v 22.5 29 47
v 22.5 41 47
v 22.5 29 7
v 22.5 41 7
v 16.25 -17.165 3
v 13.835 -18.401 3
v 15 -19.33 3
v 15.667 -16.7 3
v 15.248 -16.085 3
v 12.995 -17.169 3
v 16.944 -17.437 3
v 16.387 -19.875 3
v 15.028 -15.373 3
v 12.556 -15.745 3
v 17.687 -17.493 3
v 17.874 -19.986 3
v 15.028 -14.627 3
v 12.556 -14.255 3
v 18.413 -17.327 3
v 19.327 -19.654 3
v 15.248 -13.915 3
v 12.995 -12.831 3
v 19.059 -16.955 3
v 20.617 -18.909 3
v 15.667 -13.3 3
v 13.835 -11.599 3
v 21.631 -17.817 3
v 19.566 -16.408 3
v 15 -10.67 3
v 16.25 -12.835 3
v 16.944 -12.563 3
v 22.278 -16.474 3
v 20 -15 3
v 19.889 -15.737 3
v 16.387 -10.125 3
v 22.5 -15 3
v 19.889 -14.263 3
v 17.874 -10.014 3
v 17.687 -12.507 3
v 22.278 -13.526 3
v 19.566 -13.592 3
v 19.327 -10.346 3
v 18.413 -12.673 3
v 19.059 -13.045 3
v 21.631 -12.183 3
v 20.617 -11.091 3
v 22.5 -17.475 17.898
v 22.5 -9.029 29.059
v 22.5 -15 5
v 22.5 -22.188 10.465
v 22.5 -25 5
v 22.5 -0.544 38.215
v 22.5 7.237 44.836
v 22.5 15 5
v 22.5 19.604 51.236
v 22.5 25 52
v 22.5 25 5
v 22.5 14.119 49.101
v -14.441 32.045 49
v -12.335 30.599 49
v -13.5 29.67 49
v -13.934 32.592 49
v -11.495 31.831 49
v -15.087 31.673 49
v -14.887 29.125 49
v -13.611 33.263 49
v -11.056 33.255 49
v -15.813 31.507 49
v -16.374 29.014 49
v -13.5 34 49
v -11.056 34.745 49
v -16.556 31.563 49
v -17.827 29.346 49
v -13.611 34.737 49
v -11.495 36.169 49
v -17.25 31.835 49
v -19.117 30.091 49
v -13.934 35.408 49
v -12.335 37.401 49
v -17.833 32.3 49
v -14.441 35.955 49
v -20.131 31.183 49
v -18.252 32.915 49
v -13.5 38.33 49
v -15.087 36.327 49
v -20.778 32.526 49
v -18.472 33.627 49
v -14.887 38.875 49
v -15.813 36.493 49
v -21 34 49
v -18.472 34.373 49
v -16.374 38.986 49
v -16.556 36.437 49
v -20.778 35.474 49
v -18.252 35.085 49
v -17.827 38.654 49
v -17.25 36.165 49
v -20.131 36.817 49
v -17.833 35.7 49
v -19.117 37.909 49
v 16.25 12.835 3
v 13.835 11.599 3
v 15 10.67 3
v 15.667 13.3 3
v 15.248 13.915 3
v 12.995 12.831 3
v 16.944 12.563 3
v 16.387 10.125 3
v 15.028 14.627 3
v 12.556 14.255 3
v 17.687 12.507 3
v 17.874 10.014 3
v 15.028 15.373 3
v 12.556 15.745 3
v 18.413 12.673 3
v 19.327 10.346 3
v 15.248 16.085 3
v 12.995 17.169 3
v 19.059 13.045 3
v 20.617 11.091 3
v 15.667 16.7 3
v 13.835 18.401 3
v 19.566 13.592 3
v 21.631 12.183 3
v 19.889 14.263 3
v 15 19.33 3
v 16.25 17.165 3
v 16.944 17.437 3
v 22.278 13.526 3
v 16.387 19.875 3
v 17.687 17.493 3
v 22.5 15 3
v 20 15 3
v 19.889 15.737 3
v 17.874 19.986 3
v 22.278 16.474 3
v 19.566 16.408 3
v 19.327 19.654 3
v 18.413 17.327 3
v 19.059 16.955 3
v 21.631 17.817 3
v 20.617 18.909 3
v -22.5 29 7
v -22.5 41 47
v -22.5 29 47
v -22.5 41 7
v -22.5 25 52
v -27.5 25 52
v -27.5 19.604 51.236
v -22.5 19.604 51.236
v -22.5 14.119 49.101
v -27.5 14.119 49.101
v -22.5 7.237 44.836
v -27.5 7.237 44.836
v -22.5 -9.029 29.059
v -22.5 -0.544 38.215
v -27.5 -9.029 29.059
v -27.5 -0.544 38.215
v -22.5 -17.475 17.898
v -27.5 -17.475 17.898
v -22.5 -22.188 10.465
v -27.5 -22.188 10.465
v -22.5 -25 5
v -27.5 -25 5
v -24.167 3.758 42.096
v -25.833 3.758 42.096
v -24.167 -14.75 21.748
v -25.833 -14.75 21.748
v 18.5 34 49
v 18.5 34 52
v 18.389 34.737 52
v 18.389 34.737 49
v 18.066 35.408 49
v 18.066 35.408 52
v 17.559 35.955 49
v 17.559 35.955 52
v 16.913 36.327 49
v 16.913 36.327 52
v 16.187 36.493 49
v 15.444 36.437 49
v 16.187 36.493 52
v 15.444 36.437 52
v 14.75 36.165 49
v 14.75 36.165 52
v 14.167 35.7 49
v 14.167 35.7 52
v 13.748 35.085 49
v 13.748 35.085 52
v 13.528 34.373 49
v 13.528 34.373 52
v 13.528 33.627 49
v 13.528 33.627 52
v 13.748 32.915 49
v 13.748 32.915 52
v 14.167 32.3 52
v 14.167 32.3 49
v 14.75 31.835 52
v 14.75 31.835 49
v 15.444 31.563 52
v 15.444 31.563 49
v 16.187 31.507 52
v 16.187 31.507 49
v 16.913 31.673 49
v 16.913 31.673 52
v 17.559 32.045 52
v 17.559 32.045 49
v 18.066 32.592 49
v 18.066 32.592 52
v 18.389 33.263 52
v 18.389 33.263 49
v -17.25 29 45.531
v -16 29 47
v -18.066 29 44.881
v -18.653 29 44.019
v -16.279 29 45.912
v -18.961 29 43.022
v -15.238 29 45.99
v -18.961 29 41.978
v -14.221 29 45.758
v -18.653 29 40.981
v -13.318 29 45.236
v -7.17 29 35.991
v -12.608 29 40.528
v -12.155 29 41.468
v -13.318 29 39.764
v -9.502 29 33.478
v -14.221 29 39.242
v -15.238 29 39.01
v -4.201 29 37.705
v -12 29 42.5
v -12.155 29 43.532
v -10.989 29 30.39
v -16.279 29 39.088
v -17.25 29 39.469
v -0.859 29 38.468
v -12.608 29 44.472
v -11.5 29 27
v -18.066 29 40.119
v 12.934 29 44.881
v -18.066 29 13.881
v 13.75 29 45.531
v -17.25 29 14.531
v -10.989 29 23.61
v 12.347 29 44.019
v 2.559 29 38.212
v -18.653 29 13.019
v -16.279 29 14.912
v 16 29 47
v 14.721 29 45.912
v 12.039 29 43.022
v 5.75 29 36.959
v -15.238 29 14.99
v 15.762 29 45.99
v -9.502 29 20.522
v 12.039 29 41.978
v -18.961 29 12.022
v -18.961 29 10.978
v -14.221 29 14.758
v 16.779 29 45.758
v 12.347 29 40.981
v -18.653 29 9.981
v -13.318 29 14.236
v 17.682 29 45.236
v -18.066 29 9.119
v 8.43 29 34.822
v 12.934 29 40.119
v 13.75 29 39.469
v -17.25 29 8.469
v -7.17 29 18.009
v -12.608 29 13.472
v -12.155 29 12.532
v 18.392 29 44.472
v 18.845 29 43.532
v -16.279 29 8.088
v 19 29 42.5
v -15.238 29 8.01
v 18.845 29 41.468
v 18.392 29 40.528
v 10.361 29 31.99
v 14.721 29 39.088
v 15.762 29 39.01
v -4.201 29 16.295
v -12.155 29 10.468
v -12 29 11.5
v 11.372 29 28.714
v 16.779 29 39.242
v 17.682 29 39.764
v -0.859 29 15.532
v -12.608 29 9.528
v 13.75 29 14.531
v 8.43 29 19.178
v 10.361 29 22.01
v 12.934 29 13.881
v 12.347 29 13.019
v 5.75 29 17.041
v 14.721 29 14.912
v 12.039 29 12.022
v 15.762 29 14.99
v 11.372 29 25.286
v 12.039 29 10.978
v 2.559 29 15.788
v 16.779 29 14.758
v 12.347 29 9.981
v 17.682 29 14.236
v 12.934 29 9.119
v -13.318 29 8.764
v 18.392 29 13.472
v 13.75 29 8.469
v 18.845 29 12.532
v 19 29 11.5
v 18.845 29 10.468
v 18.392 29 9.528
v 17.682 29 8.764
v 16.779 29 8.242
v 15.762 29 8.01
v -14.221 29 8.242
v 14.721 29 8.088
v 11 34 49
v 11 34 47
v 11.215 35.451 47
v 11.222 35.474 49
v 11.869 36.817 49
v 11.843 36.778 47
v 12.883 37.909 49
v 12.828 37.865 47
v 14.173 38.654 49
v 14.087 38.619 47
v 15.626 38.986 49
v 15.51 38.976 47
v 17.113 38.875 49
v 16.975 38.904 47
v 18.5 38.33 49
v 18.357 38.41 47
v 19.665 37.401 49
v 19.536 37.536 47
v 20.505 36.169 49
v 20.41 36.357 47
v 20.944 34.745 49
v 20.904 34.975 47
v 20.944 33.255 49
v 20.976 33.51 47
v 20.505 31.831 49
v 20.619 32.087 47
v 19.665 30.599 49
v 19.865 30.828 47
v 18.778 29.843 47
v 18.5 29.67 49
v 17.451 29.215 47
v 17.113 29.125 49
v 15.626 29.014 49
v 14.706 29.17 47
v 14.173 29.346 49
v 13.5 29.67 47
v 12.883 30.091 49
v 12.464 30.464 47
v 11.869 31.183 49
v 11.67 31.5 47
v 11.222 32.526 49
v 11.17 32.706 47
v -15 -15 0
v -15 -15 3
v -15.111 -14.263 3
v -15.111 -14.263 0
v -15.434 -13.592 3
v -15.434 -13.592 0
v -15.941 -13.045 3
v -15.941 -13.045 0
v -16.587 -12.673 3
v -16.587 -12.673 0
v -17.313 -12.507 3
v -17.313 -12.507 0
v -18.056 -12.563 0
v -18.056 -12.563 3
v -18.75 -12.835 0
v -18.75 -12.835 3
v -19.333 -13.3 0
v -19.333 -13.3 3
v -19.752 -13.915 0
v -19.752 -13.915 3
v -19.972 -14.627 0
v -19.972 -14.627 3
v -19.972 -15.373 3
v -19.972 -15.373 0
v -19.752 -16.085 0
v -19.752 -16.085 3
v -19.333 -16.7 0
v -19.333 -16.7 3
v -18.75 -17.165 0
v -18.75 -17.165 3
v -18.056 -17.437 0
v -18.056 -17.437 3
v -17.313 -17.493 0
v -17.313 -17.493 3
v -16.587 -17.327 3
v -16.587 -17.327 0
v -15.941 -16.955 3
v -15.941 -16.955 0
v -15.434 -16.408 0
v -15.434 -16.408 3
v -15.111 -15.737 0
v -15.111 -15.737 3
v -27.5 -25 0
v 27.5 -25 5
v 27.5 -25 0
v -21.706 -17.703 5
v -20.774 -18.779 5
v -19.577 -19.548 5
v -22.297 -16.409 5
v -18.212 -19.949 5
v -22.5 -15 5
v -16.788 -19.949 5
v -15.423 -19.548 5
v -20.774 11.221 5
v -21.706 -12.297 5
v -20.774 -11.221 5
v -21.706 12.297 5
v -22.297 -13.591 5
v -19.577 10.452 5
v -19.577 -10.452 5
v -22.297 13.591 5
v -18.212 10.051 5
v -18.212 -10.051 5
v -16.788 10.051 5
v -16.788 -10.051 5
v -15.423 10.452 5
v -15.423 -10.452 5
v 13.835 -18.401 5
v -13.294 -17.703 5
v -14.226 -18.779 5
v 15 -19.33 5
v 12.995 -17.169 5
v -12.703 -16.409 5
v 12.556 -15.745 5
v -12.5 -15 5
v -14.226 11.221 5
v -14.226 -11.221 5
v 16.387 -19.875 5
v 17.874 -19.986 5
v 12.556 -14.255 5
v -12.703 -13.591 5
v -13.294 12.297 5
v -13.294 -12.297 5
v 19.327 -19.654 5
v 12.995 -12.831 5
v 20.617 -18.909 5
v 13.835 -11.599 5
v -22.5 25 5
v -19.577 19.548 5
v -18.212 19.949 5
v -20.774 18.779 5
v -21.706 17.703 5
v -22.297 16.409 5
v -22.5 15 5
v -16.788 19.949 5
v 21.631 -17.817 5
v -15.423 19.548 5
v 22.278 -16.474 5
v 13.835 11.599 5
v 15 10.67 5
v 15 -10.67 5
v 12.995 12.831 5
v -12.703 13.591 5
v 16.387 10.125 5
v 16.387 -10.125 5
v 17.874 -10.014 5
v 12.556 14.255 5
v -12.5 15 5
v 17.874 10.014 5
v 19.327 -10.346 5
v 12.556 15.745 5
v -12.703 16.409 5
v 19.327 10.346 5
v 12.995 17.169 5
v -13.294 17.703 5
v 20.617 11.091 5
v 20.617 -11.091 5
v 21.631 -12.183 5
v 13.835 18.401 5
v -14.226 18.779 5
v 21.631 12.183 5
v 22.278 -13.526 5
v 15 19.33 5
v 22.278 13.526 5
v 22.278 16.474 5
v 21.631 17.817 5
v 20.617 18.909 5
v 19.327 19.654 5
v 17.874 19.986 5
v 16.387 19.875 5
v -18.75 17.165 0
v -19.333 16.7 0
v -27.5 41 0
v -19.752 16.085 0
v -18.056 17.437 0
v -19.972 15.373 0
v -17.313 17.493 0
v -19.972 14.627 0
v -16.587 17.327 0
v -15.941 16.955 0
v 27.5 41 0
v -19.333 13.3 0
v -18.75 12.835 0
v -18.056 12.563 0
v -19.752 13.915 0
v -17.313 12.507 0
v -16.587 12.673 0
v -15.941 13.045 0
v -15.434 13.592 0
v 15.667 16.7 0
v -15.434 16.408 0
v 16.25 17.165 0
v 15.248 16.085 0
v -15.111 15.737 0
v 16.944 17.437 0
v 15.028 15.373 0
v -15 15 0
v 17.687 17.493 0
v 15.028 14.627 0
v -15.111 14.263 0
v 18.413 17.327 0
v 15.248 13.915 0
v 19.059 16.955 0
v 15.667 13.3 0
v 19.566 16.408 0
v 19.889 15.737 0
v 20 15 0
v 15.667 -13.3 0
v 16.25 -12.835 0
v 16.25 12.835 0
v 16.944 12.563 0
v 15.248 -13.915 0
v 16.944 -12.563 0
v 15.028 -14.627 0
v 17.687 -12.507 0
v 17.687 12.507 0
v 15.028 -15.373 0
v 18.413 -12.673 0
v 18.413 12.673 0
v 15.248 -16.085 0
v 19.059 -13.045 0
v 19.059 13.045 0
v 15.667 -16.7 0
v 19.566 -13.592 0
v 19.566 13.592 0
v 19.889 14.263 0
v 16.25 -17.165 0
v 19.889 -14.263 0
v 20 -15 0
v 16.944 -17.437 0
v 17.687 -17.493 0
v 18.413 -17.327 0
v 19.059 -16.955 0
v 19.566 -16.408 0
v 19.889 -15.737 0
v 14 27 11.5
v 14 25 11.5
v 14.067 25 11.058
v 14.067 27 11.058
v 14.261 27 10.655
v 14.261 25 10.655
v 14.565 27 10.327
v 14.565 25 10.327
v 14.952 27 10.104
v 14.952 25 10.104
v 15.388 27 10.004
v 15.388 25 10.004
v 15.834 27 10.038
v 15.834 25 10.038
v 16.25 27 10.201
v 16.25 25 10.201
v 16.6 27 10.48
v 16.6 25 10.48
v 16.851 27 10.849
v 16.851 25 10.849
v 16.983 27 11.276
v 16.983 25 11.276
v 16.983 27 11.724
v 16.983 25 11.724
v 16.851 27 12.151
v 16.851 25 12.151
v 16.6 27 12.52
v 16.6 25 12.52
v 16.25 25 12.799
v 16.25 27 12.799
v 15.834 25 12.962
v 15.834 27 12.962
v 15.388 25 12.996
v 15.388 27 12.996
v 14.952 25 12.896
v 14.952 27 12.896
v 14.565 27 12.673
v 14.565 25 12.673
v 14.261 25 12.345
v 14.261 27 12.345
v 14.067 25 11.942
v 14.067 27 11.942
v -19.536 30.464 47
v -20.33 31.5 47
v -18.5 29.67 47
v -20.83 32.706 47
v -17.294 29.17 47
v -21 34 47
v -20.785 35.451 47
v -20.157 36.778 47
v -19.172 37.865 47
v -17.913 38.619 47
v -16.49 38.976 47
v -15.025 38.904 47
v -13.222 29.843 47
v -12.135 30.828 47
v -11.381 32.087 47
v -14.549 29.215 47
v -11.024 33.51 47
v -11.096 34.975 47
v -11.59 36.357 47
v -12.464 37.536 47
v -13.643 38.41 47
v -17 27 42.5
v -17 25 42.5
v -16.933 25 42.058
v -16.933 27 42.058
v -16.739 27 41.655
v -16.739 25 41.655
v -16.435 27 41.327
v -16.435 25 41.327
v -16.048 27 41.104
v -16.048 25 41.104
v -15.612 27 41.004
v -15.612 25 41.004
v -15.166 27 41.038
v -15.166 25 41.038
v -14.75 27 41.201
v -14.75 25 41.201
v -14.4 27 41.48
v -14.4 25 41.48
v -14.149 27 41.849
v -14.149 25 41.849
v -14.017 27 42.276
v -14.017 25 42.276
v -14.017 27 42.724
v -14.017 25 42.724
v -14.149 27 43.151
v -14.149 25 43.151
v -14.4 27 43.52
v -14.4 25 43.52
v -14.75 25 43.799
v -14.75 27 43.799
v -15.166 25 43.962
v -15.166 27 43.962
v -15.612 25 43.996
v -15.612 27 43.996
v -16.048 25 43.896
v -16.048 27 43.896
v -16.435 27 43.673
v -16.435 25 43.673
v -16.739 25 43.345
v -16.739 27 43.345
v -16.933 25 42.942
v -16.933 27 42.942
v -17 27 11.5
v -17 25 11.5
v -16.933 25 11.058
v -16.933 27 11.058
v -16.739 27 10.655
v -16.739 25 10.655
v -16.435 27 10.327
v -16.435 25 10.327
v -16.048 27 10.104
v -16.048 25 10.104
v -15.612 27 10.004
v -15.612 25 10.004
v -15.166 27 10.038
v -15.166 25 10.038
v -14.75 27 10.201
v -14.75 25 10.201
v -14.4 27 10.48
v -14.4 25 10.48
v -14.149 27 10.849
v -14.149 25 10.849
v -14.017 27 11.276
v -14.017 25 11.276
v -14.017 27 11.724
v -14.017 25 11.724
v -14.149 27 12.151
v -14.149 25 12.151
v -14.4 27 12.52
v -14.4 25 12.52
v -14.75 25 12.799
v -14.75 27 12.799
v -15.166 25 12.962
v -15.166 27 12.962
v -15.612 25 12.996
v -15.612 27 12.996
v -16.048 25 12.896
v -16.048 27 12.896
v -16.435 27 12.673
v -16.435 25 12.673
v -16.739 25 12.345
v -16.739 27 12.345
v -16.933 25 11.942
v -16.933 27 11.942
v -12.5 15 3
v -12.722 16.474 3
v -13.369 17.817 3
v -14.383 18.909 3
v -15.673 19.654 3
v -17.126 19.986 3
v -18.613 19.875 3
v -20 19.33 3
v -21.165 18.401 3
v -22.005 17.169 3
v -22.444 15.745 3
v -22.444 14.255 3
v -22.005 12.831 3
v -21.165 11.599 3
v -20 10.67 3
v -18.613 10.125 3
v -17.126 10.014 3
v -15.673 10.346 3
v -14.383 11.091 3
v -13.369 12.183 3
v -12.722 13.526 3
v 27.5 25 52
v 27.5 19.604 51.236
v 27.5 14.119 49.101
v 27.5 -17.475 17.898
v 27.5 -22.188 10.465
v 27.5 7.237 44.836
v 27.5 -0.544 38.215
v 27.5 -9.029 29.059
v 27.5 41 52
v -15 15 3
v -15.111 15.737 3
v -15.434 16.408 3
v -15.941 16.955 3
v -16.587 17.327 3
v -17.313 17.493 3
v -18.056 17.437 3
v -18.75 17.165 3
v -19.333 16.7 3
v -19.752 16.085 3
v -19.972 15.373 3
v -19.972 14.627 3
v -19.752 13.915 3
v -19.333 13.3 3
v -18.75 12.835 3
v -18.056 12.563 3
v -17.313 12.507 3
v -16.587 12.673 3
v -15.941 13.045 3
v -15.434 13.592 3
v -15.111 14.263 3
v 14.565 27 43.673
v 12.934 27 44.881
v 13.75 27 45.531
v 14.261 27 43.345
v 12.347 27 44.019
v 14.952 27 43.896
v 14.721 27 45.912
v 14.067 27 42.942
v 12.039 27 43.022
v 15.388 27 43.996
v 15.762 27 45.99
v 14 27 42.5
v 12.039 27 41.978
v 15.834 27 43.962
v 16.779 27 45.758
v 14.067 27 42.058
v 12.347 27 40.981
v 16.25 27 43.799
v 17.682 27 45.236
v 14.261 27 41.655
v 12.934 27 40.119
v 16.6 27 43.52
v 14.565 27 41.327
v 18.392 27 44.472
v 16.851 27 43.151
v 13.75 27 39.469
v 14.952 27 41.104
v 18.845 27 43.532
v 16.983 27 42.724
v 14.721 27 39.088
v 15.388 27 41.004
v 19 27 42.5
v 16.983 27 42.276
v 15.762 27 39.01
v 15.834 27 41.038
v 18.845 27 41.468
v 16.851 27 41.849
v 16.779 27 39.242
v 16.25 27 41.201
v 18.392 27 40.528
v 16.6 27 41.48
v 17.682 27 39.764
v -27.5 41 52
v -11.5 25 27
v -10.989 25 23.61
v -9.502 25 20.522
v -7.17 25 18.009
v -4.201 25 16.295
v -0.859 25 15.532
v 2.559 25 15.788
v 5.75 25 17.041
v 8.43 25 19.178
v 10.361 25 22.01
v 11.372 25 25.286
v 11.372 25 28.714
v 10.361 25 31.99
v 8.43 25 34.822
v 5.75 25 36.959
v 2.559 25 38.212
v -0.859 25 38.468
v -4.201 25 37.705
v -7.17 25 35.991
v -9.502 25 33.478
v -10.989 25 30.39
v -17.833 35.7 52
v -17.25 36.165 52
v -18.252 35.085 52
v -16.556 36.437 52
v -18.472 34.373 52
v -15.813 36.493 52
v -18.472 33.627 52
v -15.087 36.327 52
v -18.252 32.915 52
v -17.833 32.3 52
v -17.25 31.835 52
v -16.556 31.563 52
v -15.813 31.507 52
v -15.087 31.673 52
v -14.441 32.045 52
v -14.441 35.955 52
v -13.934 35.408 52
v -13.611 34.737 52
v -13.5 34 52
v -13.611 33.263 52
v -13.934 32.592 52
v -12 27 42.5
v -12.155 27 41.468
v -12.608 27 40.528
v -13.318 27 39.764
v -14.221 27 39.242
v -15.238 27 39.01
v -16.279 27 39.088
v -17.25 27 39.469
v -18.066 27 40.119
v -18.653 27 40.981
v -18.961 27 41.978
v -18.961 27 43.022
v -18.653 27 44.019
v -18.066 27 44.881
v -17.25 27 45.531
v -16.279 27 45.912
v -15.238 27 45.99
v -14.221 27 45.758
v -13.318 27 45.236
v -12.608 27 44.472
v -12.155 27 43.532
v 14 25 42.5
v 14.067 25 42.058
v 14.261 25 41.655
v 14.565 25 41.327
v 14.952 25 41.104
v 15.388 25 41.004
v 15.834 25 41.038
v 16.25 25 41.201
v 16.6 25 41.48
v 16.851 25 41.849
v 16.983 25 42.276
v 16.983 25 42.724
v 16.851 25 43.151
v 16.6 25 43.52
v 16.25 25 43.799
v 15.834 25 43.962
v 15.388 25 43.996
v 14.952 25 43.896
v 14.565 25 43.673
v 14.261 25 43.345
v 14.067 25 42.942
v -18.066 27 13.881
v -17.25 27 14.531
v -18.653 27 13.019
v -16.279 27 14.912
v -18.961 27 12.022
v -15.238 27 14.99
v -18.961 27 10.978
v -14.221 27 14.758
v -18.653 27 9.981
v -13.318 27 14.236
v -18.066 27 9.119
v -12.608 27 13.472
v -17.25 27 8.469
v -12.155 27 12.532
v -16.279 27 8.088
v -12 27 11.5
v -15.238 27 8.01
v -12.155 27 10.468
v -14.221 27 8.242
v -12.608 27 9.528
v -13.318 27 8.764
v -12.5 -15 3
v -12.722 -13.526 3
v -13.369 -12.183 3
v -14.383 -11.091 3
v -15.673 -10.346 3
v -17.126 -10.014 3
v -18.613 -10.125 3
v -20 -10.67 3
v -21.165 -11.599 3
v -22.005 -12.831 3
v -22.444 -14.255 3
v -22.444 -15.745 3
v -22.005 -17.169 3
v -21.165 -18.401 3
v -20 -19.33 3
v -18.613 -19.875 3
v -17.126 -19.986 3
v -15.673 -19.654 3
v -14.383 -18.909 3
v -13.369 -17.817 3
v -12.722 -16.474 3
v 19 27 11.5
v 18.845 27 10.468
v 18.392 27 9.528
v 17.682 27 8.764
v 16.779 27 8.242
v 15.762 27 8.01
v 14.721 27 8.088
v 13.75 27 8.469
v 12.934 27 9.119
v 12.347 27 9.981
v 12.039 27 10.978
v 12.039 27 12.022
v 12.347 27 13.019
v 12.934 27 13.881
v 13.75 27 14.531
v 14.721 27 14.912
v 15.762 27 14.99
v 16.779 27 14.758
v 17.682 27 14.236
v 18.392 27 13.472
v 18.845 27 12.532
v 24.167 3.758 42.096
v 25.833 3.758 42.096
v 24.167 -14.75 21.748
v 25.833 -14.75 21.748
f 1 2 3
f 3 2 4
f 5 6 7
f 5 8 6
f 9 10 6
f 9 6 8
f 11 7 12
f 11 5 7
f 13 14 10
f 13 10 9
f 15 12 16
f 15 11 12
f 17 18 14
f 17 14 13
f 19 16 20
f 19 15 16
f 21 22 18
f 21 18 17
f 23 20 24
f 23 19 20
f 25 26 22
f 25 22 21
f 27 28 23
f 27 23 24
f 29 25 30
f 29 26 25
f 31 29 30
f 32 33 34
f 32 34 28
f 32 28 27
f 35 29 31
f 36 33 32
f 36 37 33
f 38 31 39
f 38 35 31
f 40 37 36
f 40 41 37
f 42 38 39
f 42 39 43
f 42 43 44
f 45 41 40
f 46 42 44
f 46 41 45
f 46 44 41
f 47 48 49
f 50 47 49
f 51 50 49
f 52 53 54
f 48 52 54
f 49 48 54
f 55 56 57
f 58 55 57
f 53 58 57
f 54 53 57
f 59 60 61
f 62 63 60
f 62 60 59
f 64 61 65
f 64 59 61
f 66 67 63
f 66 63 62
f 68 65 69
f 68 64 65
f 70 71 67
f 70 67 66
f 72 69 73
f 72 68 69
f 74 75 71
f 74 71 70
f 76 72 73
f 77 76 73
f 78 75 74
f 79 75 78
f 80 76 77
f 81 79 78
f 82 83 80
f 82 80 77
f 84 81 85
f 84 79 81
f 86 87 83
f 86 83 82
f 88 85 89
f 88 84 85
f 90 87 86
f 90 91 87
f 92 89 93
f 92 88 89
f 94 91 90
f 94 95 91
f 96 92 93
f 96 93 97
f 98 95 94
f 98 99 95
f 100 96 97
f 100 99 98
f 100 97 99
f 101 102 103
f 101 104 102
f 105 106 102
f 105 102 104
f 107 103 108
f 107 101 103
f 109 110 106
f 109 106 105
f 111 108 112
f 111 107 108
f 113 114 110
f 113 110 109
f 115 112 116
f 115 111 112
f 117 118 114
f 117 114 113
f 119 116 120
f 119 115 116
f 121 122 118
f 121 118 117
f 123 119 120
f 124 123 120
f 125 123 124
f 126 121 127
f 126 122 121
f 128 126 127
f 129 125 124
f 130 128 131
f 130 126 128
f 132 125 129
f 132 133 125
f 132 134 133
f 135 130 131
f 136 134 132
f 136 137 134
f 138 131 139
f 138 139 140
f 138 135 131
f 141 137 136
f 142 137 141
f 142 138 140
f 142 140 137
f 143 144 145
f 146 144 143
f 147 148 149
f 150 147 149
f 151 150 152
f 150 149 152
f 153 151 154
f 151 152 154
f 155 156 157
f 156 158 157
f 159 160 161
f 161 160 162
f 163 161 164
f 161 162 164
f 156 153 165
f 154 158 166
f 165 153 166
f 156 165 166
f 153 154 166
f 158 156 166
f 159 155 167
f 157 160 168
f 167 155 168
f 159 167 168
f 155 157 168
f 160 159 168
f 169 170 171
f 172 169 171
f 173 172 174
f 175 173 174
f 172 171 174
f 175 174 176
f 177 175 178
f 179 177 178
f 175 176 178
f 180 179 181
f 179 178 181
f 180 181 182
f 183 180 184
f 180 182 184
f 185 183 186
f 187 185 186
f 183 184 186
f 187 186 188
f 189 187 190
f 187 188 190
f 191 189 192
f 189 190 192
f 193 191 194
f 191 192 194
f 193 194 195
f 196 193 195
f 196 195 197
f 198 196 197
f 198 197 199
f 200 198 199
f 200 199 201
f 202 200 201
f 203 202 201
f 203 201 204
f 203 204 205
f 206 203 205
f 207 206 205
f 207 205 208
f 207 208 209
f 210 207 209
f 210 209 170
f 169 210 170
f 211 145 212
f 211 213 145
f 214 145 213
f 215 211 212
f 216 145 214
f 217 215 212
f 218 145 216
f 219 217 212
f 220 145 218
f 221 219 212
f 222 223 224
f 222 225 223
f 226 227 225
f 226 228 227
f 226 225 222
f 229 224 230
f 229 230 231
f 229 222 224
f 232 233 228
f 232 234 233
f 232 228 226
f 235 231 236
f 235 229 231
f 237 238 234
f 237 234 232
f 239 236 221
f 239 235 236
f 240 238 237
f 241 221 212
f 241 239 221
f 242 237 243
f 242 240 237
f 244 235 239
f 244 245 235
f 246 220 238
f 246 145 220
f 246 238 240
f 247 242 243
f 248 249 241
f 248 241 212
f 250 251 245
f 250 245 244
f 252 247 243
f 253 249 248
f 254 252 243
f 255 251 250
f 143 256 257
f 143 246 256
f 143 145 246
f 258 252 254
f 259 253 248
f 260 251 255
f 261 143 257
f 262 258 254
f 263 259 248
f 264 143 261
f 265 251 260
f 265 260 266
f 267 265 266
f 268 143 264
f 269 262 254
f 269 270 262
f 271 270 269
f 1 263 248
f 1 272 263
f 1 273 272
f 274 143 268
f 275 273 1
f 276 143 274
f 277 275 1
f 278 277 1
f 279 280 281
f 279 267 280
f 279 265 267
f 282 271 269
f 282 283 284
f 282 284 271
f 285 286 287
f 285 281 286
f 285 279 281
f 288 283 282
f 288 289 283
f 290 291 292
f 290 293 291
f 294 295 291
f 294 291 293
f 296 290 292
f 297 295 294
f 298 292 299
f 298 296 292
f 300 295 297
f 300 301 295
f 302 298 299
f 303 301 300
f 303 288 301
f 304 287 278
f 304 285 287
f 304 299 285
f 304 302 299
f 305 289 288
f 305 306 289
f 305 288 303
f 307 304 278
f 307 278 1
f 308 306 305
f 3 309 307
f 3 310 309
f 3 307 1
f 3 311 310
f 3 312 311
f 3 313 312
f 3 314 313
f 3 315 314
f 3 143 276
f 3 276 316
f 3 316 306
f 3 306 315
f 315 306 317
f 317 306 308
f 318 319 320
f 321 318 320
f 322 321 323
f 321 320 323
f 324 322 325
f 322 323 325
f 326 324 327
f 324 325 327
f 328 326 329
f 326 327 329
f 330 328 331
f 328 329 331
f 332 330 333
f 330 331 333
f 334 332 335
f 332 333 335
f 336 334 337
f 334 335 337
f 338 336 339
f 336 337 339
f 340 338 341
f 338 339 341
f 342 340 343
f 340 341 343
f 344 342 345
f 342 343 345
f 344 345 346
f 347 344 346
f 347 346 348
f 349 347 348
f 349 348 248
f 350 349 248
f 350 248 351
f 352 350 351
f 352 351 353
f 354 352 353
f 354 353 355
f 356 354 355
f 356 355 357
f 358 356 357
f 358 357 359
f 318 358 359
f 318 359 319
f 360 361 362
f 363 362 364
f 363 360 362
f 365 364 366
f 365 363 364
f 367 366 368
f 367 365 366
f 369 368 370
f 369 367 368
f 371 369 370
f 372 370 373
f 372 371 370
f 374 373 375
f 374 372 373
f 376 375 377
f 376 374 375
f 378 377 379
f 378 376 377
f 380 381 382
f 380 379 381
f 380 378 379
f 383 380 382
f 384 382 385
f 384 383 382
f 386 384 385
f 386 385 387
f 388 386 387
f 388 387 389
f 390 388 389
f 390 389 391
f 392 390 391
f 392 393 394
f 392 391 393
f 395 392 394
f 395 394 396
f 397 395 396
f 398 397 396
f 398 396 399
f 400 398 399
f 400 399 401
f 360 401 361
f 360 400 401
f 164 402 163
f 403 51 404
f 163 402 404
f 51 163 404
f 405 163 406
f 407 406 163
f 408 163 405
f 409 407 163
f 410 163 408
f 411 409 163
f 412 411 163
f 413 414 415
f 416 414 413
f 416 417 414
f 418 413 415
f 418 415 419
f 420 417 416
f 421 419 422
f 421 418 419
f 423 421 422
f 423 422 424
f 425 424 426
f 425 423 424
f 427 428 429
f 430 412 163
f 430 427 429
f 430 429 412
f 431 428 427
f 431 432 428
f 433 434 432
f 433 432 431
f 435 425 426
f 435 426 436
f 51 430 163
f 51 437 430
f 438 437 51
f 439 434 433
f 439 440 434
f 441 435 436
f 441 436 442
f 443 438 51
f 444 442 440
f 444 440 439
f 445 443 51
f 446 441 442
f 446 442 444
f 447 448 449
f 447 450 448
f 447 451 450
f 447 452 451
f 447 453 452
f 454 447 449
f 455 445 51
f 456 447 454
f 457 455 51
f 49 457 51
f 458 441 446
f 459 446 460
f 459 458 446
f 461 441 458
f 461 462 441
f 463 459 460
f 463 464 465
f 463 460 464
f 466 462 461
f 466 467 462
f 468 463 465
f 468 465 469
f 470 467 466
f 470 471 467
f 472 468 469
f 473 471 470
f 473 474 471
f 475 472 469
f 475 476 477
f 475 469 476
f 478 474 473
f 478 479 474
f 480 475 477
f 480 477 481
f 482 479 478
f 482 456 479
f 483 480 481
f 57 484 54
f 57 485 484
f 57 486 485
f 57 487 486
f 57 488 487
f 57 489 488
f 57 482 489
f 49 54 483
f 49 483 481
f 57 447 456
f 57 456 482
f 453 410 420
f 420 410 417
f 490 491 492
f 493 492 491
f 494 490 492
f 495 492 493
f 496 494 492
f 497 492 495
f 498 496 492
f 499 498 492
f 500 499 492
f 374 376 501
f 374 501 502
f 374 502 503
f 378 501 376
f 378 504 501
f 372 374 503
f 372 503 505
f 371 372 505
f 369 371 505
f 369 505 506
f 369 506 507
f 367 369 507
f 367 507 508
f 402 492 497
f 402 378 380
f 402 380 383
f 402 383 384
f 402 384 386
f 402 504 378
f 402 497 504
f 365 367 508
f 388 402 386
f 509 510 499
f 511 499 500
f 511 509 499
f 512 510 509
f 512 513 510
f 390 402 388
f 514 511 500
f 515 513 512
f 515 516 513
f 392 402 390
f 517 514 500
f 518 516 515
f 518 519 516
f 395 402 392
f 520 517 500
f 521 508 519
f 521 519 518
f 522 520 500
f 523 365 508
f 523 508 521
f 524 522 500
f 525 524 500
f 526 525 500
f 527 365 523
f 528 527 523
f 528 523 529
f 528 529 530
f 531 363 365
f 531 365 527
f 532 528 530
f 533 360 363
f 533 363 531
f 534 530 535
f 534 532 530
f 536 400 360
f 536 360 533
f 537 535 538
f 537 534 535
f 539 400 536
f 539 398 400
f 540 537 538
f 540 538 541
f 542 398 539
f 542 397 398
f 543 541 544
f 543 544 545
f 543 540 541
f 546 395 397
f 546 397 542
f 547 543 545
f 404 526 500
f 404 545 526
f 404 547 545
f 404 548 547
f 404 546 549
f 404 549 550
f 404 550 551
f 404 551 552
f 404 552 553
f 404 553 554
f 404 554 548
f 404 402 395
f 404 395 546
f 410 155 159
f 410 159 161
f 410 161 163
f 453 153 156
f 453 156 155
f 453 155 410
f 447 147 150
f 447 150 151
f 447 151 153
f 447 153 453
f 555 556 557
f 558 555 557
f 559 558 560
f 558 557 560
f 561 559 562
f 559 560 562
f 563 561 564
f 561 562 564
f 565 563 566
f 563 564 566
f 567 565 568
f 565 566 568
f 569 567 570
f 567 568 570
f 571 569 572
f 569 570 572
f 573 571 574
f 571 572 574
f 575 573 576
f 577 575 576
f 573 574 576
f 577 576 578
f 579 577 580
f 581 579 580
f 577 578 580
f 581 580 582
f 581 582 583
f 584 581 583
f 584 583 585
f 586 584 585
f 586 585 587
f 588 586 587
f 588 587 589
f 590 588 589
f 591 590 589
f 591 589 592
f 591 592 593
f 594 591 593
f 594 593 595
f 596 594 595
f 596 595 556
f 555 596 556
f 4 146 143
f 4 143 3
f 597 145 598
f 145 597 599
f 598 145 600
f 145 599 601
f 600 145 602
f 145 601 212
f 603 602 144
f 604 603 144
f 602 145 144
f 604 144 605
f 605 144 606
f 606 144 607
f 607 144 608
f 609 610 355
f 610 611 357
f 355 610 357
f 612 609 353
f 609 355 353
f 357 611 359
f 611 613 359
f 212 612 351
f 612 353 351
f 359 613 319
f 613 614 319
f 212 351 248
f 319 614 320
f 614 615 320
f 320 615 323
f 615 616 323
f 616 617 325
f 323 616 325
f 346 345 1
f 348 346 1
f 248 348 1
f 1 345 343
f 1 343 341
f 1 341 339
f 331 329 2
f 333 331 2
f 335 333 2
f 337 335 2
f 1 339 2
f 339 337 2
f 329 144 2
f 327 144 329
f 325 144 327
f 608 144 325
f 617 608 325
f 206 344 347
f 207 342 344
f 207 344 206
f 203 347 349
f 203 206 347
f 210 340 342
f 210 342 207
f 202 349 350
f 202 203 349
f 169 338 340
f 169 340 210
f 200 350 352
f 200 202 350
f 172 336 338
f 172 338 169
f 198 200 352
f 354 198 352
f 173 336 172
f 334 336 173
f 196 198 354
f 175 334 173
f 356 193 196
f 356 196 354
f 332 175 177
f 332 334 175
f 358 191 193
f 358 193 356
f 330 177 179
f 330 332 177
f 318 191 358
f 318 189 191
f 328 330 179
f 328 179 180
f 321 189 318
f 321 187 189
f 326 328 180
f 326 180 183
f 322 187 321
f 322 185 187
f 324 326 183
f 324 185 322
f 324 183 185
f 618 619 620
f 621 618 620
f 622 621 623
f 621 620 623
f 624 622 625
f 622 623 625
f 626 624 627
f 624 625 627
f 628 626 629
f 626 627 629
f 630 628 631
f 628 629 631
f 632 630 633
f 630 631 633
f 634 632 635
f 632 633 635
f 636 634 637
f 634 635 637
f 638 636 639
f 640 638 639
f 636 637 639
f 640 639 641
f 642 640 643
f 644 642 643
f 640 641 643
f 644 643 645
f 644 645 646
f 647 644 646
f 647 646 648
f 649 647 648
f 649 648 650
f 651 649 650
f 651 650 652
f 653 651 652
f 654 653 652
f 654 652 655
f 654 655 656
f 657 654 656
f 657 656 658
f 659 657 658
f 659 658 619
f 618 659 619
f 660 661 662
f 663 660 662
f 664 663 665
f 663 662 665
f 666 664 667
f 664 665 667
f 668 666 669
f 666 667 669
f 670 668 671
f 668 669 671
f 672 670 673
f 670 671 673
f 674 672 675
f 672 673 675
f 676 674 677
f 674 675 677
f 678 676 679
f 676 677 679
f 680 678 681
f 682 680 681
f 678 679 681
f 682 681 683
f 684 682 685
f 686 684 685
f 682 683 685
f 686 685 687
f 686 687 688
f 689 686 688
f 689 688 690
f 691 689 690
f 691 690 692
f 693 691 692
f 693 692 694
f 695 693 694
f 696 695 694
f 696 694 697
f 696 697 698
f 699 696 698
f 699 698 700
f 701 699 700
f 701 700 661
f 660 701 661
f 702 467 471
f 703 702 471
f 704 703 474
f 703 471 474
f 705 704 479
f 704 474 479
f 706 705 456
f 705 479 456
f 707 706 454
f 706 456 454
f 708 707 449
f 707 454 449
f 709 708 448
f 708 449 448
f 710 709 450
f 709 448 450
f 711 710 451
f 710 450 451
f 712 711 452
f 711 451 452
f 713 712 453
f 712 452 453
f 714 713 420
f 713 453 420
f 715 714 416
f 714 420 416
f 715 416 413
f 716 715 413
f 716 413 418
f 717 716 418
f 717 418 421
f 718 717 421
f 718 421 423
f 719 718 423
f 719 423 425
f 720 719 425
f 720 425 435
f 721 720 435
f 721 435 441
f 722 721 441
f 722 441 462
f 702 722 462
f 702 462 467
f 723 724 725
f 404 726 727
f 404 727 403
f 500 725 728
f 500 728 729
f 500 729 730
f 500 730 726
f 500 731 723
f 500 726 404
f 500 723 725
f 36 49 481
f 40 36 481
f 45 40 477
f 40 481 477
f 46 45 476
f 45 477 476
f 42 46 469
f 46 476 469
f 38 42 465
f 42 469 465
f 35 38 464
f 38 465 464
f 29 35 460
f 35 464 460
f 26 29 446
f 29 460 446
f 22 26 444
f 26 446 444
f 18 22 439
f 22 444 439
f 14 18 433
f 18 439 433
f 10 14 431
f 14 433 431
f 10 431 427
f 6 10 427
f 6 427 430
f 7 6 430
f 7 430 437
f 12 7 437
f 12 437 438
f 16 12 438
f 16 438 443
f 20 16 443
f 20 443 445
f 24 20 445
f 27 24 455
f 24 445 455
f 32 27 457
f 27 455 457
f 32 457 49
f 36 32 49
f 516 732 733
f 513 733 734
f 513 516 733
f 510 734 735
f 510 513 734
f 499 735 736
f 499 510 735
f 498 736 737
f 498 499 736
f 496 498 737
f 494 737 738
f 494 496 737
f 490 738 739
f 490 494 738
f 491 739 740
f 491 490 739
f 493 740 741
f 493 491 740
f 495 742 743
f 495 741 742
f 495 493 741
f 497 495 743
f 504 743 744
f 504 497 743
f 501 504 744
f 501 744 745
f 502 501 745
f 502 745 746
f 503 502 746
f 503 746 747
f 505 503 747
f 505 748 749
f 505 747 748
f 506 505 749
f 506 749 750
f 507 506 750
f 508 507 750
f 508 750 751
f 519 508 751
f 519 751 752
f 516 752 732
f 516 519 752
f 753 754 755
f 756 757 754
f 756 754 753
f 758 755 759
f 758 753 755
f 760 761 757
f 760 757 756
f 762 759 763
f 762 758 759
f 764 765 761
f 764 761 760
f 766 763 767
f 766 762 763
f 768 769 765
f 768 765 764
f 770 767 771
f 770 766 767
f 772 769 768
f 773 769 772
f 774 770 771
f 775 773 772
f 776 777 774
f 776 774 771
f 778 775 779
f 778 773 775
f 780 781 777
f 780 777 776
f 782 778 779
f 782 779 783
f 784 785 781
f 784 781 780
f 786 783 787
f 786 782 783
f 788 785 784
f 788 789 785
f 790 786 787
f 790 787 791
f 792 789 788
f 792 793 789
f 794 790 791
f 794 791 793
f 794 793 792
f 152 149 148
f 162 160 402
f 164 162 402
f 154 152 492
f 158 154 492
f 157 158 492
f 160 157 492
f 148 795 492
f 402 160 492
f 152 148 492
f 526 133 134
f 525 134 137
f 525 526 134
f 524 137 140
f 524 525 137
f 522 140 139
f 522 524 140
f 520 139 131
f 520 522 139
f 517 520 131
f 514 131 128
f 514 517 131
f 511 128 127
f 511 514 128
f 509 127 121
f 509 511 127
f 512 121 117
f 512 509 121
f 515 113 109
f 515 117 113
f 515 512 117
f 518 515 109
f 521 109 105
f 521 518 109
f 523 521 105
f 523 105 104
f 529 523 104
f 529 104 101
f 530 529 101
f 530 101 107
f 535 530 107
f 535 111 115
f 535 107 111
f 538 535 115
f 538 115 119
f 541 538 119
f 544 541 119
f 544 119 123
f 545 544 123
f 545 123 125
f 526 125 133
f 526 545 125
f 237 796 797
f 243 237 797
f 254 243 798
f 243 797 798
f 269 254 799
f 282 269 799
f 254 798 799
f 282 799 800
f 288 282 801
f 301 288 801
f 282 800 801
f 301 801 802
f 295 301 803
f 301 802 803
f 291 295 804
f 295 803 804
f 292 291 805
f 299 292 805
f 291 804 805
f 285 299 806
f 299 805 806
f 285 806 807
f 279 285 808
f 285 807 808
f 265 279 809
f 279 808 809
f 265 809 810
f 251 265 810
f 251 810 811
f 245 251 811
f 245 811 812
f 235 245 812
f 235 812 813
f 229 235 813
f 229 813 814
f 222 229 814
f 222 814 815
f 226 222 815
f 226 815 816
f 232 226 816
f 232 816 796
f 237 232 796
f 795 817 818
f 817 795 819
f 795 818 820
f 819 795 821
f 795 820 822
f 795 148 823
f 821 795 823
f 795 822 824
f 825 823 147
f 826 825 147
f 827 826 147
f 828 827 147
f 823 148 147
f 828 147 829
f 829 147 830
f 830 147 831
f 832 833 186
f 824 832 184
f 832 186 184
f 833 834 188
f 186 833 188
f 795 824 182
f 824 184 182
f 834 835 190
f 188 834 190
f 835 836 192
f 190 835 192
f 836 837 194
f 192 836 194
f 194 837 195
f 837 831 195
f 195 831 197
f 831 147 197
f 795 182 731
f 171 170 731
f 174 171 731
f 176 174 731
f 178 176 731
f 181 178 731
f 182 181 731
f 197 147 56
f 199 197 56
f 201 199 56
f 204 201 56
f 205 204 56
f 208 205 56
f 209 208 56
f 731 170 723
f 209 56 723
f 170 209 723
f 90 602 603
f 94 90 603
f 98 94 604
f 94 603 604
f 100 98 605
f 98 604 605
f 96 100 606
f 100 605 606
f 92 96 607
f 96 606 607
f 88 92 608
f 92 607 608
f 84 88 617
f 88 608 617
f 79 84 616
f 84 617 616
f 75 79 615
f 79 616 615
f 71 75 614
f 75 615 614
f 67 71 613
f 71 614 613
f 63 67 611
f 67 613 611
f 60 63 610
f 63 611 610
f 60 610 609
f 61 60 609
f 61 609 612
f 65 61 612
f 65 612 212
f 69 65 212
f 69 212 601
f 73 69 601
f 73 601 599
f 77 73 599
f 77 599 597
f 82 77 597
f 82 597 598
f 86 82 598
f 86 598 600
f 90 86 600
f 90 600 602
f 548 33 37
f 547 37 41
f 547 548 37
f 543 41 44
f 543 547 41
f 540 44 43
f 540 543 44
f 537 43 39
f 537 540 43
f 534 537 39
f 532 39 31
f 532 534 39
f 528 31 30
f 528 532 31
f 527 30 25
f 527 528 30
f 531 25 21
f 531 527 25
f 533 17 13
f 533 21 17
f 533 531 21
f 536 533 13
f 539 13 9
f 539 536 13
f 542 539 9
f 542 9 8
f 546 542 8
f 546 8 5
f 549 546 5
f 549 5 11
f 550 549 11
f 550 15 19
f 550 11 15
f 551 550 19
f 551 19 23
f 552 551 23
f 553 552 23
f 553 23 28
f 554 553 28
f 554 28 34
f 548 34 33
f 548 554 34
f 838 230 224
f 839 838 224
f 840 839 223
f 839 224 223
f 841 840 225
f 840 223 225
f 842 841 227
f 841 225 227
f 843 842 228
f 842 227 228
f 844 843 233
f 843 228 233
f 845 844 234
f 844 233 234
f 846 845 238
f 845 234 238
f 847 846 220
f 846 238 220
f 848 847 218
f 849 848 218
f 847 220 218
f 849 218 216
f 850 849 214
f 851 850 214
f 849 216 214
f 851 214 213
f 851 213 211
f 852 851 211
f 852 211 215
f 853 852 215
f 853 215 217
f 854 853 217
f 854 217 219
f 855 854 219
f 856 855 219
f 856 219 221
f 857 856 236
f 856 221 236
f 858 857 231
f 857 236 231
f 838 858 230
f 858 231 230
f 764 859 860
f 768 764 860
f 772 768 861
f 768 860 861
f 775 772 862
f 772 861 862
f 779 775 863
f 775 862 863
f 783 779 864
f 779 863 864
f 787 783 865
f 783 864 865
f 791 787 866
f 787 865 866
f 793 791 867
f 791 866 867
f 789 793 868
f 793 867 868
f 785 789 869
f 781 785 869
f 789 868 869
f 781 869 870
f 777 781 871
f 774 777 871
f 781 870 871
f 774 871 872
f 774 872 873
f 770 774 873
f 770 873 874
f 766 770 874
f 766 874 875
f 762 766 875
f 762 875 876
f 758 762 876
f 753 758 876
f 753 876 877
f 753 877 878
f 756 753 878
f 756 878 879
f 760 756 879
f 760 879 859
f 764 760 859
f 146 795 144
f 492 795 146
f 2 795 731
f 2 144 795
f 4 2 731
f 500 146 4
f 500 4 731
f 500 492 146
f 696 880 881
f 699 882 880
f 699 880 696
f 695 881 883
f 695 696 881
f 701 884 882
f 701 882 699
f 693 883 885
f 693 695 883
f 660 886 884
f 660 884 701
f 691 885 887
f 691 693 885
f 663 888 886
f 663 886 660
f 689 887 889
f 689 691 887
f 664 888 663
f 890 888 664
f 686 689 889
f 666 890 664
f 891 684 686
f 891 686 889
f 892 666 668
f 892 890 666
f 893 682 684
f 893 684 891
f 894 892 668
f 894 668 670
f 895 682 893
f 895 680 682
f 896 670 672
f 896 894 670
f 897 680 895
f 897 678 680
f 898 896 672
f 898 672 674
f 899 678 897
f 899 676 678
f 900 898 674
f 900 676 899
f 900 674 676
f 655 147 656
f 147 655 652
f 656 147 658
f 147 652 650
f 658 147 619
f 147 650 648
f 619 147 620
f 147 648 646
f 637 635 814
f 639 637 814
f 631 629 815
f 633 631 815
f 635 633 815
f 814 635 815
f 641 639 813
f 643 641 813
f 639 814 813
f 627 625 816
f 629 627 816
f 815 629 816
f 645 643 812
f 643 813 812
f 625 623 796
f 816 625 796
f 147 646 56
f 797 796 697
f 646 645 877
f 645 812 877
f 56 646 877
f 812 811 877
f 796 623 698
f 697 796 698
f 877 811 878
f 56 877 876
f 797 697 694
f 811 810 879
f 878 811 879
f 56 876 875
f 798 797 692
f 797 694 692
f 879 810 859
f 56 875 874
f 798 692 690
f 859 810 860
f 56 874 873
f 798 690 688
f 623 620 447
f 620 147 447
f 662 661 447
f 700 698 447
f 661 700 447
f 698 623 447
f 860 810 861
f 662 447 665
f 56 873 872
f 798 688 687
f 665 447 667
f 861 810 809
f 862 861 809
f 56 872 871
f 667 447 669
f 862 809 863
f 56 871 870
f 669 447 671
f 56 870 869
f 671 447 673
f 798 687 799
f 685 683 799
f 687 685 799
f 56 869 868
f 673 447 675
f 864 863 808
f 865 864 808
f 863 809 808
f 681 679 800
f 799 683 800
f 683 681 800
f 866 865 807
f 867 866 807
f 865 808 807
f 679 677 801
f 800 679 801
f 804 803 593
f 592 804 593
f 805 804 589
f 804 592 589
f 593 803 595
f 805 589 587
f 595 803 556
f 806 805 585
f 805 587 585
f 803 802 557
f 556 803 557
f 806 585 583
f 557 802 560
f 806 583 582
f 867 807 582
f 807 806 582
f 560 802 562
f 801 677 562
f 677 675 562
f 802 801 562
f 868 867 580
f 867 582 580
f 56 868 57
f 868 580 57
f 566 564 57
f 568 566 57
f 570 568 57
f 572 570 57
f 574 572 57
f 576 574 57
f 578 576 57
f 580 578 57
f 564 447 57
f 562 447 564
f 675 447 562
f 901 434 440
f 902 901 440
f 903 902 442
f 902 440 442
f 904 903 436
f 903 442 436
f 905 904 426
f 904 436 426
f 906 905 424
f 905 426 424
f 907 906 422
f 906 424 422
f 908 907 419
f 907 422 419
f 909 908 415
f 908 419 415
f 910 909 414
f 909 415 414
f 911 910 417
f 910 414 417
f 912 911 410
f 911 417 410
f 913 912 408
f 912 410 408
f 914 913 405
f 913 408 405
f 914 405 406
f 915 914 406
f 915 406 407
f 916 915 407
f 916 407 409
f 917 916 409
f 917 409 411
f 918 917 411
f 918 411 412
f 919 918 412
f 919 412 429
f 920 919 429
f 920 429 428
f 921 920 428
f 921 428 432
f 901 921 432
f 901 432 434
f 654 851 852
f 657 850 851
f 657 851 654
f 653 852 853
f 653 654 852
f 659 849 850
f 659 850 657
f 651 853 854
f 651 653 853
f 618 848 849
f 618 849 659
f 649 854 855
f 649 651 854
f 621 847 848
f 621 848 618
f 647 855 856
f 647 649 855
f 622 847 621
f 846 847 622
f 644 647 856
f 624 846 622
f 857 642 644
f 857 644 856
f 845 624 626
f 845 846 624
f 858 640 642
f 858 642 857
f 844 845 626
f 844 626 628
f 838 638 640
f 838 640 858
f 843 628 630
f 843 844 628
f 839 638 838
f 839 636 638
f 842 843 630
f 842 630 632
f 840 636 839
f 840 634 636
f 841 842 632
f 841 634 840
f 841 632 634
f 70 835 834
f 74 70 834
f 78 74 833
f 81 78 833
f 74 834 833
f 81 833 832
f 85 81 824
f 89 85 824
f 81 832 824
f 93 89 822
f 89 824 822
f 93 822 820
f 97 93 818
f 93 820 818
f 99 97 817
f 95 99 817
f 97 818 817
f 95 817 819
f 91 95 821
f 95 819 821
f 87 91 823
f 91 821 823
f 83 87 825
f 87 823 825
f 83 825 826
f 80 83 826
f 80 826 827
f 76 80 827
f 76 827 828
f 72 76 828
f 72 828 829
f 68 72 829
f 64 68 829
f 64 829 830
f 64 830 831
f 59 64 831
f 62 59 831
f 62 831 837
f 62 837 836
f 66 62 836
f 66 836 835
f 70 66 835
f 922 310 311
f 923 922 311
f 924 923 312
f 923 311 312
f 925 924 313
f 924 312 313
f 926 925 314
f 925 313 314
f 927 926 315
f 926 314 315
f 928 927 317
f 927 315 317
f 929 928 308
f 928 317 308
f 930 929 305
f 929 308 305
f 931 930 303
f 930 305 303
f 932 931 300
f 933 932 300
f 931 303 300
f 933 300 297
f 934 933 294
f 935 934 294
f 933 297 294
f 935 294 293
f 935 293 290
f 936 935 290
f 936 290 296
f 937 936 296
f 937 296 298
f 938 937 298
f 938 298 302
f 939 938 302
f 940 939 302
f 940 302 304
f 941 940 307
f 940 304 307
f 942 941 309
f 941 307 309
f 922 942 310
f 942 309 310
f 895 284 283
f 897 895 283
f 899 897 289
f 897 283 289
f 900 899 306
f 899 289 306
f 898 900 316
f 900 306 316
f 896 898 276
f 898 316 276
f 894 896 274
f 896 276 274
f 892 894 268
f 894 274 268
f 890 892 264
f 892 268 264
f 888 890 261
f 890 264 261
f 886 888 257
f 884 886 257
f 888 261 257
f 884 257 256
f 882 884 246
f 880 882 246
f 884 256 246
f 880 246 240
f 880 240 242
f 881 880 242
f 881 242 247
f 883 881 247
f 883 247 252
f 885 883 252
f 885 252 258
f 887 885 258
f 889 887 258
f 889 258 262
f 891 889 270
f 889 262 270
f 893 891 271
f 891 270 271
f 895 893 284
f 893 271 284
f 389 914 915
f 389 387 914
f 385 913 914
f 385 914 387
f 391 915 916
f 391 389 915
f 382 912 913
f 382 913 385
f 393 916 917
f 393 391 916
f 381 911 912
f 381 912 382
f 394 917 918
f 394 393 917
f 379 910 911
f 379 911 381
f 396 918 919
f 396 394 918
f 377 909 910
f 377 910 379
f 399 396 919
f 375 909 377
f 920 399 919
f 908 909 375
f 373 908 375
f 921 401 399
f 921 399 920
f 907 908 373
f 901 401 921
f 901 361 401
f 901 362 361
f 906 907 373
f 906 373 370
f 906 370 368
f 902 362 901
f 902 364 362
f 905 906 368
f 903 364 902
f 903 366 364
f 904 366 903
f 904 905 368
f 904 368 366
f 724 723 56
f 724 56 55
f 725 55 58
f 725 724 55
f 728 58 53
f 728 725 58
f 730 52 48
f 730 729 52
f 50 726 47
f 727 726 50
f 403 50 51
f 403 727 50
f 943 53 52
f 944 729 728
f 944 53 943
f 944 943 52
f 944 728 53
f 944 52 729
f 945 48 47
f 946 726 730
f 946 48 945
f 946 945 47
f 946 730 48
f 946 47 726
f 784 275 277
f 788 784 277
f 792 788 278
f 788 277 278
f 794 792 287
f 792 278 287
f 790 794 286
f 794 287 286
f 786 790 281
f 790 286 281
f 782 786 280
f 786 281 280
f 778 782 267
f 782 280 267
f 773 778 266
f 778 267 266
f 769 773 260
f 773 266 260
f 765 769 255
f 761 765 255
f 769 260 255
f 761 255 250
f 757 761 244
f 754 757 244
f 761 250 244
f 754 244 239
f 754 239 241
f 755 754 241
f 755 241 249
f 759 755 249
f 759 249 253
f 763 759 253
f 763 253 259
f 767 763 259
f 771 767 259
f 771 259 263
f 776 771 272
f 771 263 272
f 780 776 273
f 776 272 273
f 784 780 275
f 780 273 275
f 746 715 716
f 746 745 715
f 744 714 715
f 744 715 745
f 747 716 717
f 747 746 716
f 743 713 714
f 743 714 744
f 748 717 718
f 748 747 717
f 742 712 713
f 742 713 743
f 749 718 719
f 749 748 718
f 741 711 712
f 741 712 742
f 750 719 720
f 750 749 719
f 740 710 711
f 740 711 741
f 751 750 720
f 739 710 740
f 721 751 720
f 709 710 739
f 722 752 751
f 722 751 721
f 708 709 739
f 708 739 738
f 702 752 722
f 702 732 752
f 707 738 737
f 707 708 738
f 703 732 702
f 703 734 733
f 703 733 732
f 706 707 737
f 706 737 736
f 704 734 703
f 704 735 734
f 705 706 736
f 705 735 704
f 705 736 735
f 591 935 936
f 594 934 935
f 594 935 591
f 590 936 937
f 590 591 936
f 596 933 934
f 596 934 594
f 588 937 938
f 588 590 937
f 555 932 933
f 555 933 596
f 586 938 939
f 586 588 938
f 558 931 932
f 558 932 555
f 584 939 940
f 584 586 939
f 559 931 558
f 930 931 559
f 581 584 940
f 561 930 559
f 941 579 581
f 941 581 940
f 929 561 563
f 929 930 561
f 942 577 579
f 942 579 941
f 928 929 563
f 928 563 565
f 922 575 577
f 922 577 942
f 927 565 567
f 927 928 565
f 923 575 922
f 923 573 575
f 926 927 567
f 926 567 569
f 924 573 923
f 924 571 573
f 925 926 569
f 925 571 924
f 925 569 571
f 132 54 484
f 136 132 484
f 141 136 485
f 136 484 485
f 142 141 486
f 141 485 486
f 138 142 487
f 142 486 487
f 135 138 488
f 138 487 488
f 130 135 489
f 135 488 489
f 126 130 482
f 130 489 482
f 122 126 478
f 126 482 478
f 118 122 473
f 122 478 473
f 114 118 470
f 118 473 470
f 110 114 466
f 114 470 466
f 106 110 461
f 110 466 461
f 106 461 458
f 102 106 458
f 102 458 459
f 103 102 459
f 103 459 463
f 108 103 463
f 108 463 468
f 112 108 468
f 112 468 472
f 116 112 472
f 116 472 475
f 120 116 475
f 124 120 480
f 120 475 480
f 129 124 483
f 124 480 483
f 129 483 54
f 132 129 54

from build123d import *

# Parameters (mm, degrees)
SKETCH1_W           = 55
SKETCH1_H           = 50
SKETCH1_R           = 2.5
BOSS_EXTRUDE1_DEPTH = 5
SKETCH2_R           = 5
CUT_EXTRUDE1_DEPTH  = 2
SKETCH3_W           = 55
SKETCH3_H           = 52
BOSS_EXTRUDE2_DEPTH = 16
SKETCH4_R           = 11.5
SKETCH4_R_2         = 1.5
CUT_EXTRUDE2_DEPTH  = 17
BOSS_EXTRUDE3_DEPTH = 5
SKETCH6_W           = 45
SKETCH6_H           = 40
CUT_EXTRUDE3_DEPTH  = 12
SKETCH7_R           = 3.5
CUT_EXTRUDE4_DEPTH  = 2
SKETCH8_R           = 2.5
CUT_EXTRUDE5_DEPTH  = 5
SKETCH10_R          = 5
CUT_EXTRUDE6_DEPTH  = 2


with BuildPart() as part:
    # Sketch1 → Boss-Extrude1 (new body)
    with BuildSketch(Plane.XY):
        Rectangle(SKETCH1_W, SKETCH1_H)
        with Locations((-17.5, -15)):
            Circle(SKETCH1_R, mode=Mode.SUBTRACT)
        with Locations((17.5, -15)):
            Circle(SKETCH1_R, mode=Mode.SUBTRACT)
        with Locations((-17.5, 15)):
            Circle(SKETCH1_R, mode=Mode.SUBTRACT)
        with Locations((17.5, 15)):
            Circle(SKETCH1_R, mode=Mode.SUBTRACT)
    extrude(amount=BOSS_EXTRUDE1_DEPTH)

    # Sketch2 → Cut-Extrude1 (cut)
    with BuildSketch(Plane.XY.offset(5)):
        with Locations((-17.5, -15)):
            Circle(SKETCH2_R)
        with Locations((17.5, -15)):
            Circle(SKETCH2_R)
        with Locations((-17.5, 15)):
            Circle(SKETCH2_R)
        with Locations((17.5, 15)):
            Circle(SKETCH2_R)
    extrude(amount=-CUT_EXTRUDE1_DEPTH, mode=Mode.SUBTRACT)

    # Sketch3 → Boss-Extrude2 (add)
    with BuildSketch(Plane(origin=(0, 25, 0), x_dir=(1, 0, 0), z_dir=(0, 1, 0))):
        with Locations((0, -26)):
            Rectangle(SKETCH3_W, SKETCH3_H)
    extrude(amount=BOSS_EXTRUDE2_DEPTH)

    # Sketch4 → Cut-Extrude2 (cut, through all)
    with BuildSketch(Plane(origin=(0, 25, 0), x_dir=(-1, 0, 0), z_dir=(0, -1, 0))):
        with Locations((0, -27)):
            Circle(SKETCH4_R)
        with Locations((15.5, -42.5)):
            Circle(SKETCH4_R_2)
        with Locations((-15.5, -42.5)):
            Circle(SKETCH4_R_2)
        with Locations((-15.5, -11.5)):
            Circle(SKETCH4_R_2)
        with Locations((15.5, -11.5)):
            Circle(SKETCH4_R_2)
    extrude(amount=-CUT_EXTRUDE2_DEPTH, mode=Mode.SUBTRACT)

    # Sketch5 → Boss-Extrude3 (add)
    with BuildSketch(Plane.ZY.offset(27.5)):
        with BuildLine():
            Line((5, -25), (5, 25))
            Line((5, 25), (52, 25))
            add(Edge.make_bspline(
                [(52, 25), (52, 4.232970162), (15.26663468, -20.719918254), (5, -25)],
                knots=[0, 0, 0, 0, 0.911487557, 0.911487557, 0.911487557, 0.911487557], degree=3))
        make_face()
    boss_extrude3 = extrude(amount=-BOSS_EXTRUDE3_DEPTH)

    # Mirror1: Boss-Extrude3 across plane
    add(boss_extrude3.mirror(Plane(origin=(0, 0, 0), x_dir=(0, 0, 1), z_dir=(1, 0, 0))))

    # Sketch6 → Cut-Extrude3 (cut)
    with BuildSketch(Plane(origin=(0, 41, 0), x_dir=(1, 0, 0), z_dir=(0, 1, 0))):
        with Locations((0, -27)):
            Rectangle(SKETCH6_W, SKETCH6_H)
    extrude(amount=-CUT_EXTRUDE3_DEPTH, mode=Mode.SUBTRACT)

    # Sketch7 → Cut-Extrude4 (cut)
    with BuildSketch(Plane(origin=(0, 29, 0), x_dir=(1, 0, 0), z_dir=(0, 1, 0))):
        with Locations((-15.5, -11.5)):
            Circle(SKETCH7_R)
        with Locations((15.5, -11.5)):
            Circle(SKETCH7_R)
        with Locations((15.5, -42.5)):
            Circle(SKETCH7_R)
        with Locations((-15.5, -42.5)):
            Circle(SKETCH7_R)
    extrude(amount=-CUT_EXTRUDE4_DEPTH, mode=Mode.SUBTRACT)

    # Sketch8 → Cut-Extrude5 (cut)
    with BuildSketch(Plane.XY.offset(52)):
        with Locations((16, 34)):
            Circle(SKETCH8_R)
        with Locations((-16, 34)):
            Circle(SKETCH8_R)
    extrude(amount=-CUT_EXTRUDE5_DEPTH, mode=Mode.SUBTRACT)

    # Sketch10 → Cut-Extrude6 (cut)
    with BuildSketch(Plane(origin=(0, 0, 47), x_dir=(-1, 0, 0), z_dir=(0, 0, -1))):
        with Locations((-16, 34)):
            Circle(SKETCH10_R)
        with Locations((16, 34)):
            Circle(SKETCH10_R)
    extrude(amount=-CUT_EXTRUDE6_DEPTH, mode=Mode.SUBTRACT)


solid = part.part
